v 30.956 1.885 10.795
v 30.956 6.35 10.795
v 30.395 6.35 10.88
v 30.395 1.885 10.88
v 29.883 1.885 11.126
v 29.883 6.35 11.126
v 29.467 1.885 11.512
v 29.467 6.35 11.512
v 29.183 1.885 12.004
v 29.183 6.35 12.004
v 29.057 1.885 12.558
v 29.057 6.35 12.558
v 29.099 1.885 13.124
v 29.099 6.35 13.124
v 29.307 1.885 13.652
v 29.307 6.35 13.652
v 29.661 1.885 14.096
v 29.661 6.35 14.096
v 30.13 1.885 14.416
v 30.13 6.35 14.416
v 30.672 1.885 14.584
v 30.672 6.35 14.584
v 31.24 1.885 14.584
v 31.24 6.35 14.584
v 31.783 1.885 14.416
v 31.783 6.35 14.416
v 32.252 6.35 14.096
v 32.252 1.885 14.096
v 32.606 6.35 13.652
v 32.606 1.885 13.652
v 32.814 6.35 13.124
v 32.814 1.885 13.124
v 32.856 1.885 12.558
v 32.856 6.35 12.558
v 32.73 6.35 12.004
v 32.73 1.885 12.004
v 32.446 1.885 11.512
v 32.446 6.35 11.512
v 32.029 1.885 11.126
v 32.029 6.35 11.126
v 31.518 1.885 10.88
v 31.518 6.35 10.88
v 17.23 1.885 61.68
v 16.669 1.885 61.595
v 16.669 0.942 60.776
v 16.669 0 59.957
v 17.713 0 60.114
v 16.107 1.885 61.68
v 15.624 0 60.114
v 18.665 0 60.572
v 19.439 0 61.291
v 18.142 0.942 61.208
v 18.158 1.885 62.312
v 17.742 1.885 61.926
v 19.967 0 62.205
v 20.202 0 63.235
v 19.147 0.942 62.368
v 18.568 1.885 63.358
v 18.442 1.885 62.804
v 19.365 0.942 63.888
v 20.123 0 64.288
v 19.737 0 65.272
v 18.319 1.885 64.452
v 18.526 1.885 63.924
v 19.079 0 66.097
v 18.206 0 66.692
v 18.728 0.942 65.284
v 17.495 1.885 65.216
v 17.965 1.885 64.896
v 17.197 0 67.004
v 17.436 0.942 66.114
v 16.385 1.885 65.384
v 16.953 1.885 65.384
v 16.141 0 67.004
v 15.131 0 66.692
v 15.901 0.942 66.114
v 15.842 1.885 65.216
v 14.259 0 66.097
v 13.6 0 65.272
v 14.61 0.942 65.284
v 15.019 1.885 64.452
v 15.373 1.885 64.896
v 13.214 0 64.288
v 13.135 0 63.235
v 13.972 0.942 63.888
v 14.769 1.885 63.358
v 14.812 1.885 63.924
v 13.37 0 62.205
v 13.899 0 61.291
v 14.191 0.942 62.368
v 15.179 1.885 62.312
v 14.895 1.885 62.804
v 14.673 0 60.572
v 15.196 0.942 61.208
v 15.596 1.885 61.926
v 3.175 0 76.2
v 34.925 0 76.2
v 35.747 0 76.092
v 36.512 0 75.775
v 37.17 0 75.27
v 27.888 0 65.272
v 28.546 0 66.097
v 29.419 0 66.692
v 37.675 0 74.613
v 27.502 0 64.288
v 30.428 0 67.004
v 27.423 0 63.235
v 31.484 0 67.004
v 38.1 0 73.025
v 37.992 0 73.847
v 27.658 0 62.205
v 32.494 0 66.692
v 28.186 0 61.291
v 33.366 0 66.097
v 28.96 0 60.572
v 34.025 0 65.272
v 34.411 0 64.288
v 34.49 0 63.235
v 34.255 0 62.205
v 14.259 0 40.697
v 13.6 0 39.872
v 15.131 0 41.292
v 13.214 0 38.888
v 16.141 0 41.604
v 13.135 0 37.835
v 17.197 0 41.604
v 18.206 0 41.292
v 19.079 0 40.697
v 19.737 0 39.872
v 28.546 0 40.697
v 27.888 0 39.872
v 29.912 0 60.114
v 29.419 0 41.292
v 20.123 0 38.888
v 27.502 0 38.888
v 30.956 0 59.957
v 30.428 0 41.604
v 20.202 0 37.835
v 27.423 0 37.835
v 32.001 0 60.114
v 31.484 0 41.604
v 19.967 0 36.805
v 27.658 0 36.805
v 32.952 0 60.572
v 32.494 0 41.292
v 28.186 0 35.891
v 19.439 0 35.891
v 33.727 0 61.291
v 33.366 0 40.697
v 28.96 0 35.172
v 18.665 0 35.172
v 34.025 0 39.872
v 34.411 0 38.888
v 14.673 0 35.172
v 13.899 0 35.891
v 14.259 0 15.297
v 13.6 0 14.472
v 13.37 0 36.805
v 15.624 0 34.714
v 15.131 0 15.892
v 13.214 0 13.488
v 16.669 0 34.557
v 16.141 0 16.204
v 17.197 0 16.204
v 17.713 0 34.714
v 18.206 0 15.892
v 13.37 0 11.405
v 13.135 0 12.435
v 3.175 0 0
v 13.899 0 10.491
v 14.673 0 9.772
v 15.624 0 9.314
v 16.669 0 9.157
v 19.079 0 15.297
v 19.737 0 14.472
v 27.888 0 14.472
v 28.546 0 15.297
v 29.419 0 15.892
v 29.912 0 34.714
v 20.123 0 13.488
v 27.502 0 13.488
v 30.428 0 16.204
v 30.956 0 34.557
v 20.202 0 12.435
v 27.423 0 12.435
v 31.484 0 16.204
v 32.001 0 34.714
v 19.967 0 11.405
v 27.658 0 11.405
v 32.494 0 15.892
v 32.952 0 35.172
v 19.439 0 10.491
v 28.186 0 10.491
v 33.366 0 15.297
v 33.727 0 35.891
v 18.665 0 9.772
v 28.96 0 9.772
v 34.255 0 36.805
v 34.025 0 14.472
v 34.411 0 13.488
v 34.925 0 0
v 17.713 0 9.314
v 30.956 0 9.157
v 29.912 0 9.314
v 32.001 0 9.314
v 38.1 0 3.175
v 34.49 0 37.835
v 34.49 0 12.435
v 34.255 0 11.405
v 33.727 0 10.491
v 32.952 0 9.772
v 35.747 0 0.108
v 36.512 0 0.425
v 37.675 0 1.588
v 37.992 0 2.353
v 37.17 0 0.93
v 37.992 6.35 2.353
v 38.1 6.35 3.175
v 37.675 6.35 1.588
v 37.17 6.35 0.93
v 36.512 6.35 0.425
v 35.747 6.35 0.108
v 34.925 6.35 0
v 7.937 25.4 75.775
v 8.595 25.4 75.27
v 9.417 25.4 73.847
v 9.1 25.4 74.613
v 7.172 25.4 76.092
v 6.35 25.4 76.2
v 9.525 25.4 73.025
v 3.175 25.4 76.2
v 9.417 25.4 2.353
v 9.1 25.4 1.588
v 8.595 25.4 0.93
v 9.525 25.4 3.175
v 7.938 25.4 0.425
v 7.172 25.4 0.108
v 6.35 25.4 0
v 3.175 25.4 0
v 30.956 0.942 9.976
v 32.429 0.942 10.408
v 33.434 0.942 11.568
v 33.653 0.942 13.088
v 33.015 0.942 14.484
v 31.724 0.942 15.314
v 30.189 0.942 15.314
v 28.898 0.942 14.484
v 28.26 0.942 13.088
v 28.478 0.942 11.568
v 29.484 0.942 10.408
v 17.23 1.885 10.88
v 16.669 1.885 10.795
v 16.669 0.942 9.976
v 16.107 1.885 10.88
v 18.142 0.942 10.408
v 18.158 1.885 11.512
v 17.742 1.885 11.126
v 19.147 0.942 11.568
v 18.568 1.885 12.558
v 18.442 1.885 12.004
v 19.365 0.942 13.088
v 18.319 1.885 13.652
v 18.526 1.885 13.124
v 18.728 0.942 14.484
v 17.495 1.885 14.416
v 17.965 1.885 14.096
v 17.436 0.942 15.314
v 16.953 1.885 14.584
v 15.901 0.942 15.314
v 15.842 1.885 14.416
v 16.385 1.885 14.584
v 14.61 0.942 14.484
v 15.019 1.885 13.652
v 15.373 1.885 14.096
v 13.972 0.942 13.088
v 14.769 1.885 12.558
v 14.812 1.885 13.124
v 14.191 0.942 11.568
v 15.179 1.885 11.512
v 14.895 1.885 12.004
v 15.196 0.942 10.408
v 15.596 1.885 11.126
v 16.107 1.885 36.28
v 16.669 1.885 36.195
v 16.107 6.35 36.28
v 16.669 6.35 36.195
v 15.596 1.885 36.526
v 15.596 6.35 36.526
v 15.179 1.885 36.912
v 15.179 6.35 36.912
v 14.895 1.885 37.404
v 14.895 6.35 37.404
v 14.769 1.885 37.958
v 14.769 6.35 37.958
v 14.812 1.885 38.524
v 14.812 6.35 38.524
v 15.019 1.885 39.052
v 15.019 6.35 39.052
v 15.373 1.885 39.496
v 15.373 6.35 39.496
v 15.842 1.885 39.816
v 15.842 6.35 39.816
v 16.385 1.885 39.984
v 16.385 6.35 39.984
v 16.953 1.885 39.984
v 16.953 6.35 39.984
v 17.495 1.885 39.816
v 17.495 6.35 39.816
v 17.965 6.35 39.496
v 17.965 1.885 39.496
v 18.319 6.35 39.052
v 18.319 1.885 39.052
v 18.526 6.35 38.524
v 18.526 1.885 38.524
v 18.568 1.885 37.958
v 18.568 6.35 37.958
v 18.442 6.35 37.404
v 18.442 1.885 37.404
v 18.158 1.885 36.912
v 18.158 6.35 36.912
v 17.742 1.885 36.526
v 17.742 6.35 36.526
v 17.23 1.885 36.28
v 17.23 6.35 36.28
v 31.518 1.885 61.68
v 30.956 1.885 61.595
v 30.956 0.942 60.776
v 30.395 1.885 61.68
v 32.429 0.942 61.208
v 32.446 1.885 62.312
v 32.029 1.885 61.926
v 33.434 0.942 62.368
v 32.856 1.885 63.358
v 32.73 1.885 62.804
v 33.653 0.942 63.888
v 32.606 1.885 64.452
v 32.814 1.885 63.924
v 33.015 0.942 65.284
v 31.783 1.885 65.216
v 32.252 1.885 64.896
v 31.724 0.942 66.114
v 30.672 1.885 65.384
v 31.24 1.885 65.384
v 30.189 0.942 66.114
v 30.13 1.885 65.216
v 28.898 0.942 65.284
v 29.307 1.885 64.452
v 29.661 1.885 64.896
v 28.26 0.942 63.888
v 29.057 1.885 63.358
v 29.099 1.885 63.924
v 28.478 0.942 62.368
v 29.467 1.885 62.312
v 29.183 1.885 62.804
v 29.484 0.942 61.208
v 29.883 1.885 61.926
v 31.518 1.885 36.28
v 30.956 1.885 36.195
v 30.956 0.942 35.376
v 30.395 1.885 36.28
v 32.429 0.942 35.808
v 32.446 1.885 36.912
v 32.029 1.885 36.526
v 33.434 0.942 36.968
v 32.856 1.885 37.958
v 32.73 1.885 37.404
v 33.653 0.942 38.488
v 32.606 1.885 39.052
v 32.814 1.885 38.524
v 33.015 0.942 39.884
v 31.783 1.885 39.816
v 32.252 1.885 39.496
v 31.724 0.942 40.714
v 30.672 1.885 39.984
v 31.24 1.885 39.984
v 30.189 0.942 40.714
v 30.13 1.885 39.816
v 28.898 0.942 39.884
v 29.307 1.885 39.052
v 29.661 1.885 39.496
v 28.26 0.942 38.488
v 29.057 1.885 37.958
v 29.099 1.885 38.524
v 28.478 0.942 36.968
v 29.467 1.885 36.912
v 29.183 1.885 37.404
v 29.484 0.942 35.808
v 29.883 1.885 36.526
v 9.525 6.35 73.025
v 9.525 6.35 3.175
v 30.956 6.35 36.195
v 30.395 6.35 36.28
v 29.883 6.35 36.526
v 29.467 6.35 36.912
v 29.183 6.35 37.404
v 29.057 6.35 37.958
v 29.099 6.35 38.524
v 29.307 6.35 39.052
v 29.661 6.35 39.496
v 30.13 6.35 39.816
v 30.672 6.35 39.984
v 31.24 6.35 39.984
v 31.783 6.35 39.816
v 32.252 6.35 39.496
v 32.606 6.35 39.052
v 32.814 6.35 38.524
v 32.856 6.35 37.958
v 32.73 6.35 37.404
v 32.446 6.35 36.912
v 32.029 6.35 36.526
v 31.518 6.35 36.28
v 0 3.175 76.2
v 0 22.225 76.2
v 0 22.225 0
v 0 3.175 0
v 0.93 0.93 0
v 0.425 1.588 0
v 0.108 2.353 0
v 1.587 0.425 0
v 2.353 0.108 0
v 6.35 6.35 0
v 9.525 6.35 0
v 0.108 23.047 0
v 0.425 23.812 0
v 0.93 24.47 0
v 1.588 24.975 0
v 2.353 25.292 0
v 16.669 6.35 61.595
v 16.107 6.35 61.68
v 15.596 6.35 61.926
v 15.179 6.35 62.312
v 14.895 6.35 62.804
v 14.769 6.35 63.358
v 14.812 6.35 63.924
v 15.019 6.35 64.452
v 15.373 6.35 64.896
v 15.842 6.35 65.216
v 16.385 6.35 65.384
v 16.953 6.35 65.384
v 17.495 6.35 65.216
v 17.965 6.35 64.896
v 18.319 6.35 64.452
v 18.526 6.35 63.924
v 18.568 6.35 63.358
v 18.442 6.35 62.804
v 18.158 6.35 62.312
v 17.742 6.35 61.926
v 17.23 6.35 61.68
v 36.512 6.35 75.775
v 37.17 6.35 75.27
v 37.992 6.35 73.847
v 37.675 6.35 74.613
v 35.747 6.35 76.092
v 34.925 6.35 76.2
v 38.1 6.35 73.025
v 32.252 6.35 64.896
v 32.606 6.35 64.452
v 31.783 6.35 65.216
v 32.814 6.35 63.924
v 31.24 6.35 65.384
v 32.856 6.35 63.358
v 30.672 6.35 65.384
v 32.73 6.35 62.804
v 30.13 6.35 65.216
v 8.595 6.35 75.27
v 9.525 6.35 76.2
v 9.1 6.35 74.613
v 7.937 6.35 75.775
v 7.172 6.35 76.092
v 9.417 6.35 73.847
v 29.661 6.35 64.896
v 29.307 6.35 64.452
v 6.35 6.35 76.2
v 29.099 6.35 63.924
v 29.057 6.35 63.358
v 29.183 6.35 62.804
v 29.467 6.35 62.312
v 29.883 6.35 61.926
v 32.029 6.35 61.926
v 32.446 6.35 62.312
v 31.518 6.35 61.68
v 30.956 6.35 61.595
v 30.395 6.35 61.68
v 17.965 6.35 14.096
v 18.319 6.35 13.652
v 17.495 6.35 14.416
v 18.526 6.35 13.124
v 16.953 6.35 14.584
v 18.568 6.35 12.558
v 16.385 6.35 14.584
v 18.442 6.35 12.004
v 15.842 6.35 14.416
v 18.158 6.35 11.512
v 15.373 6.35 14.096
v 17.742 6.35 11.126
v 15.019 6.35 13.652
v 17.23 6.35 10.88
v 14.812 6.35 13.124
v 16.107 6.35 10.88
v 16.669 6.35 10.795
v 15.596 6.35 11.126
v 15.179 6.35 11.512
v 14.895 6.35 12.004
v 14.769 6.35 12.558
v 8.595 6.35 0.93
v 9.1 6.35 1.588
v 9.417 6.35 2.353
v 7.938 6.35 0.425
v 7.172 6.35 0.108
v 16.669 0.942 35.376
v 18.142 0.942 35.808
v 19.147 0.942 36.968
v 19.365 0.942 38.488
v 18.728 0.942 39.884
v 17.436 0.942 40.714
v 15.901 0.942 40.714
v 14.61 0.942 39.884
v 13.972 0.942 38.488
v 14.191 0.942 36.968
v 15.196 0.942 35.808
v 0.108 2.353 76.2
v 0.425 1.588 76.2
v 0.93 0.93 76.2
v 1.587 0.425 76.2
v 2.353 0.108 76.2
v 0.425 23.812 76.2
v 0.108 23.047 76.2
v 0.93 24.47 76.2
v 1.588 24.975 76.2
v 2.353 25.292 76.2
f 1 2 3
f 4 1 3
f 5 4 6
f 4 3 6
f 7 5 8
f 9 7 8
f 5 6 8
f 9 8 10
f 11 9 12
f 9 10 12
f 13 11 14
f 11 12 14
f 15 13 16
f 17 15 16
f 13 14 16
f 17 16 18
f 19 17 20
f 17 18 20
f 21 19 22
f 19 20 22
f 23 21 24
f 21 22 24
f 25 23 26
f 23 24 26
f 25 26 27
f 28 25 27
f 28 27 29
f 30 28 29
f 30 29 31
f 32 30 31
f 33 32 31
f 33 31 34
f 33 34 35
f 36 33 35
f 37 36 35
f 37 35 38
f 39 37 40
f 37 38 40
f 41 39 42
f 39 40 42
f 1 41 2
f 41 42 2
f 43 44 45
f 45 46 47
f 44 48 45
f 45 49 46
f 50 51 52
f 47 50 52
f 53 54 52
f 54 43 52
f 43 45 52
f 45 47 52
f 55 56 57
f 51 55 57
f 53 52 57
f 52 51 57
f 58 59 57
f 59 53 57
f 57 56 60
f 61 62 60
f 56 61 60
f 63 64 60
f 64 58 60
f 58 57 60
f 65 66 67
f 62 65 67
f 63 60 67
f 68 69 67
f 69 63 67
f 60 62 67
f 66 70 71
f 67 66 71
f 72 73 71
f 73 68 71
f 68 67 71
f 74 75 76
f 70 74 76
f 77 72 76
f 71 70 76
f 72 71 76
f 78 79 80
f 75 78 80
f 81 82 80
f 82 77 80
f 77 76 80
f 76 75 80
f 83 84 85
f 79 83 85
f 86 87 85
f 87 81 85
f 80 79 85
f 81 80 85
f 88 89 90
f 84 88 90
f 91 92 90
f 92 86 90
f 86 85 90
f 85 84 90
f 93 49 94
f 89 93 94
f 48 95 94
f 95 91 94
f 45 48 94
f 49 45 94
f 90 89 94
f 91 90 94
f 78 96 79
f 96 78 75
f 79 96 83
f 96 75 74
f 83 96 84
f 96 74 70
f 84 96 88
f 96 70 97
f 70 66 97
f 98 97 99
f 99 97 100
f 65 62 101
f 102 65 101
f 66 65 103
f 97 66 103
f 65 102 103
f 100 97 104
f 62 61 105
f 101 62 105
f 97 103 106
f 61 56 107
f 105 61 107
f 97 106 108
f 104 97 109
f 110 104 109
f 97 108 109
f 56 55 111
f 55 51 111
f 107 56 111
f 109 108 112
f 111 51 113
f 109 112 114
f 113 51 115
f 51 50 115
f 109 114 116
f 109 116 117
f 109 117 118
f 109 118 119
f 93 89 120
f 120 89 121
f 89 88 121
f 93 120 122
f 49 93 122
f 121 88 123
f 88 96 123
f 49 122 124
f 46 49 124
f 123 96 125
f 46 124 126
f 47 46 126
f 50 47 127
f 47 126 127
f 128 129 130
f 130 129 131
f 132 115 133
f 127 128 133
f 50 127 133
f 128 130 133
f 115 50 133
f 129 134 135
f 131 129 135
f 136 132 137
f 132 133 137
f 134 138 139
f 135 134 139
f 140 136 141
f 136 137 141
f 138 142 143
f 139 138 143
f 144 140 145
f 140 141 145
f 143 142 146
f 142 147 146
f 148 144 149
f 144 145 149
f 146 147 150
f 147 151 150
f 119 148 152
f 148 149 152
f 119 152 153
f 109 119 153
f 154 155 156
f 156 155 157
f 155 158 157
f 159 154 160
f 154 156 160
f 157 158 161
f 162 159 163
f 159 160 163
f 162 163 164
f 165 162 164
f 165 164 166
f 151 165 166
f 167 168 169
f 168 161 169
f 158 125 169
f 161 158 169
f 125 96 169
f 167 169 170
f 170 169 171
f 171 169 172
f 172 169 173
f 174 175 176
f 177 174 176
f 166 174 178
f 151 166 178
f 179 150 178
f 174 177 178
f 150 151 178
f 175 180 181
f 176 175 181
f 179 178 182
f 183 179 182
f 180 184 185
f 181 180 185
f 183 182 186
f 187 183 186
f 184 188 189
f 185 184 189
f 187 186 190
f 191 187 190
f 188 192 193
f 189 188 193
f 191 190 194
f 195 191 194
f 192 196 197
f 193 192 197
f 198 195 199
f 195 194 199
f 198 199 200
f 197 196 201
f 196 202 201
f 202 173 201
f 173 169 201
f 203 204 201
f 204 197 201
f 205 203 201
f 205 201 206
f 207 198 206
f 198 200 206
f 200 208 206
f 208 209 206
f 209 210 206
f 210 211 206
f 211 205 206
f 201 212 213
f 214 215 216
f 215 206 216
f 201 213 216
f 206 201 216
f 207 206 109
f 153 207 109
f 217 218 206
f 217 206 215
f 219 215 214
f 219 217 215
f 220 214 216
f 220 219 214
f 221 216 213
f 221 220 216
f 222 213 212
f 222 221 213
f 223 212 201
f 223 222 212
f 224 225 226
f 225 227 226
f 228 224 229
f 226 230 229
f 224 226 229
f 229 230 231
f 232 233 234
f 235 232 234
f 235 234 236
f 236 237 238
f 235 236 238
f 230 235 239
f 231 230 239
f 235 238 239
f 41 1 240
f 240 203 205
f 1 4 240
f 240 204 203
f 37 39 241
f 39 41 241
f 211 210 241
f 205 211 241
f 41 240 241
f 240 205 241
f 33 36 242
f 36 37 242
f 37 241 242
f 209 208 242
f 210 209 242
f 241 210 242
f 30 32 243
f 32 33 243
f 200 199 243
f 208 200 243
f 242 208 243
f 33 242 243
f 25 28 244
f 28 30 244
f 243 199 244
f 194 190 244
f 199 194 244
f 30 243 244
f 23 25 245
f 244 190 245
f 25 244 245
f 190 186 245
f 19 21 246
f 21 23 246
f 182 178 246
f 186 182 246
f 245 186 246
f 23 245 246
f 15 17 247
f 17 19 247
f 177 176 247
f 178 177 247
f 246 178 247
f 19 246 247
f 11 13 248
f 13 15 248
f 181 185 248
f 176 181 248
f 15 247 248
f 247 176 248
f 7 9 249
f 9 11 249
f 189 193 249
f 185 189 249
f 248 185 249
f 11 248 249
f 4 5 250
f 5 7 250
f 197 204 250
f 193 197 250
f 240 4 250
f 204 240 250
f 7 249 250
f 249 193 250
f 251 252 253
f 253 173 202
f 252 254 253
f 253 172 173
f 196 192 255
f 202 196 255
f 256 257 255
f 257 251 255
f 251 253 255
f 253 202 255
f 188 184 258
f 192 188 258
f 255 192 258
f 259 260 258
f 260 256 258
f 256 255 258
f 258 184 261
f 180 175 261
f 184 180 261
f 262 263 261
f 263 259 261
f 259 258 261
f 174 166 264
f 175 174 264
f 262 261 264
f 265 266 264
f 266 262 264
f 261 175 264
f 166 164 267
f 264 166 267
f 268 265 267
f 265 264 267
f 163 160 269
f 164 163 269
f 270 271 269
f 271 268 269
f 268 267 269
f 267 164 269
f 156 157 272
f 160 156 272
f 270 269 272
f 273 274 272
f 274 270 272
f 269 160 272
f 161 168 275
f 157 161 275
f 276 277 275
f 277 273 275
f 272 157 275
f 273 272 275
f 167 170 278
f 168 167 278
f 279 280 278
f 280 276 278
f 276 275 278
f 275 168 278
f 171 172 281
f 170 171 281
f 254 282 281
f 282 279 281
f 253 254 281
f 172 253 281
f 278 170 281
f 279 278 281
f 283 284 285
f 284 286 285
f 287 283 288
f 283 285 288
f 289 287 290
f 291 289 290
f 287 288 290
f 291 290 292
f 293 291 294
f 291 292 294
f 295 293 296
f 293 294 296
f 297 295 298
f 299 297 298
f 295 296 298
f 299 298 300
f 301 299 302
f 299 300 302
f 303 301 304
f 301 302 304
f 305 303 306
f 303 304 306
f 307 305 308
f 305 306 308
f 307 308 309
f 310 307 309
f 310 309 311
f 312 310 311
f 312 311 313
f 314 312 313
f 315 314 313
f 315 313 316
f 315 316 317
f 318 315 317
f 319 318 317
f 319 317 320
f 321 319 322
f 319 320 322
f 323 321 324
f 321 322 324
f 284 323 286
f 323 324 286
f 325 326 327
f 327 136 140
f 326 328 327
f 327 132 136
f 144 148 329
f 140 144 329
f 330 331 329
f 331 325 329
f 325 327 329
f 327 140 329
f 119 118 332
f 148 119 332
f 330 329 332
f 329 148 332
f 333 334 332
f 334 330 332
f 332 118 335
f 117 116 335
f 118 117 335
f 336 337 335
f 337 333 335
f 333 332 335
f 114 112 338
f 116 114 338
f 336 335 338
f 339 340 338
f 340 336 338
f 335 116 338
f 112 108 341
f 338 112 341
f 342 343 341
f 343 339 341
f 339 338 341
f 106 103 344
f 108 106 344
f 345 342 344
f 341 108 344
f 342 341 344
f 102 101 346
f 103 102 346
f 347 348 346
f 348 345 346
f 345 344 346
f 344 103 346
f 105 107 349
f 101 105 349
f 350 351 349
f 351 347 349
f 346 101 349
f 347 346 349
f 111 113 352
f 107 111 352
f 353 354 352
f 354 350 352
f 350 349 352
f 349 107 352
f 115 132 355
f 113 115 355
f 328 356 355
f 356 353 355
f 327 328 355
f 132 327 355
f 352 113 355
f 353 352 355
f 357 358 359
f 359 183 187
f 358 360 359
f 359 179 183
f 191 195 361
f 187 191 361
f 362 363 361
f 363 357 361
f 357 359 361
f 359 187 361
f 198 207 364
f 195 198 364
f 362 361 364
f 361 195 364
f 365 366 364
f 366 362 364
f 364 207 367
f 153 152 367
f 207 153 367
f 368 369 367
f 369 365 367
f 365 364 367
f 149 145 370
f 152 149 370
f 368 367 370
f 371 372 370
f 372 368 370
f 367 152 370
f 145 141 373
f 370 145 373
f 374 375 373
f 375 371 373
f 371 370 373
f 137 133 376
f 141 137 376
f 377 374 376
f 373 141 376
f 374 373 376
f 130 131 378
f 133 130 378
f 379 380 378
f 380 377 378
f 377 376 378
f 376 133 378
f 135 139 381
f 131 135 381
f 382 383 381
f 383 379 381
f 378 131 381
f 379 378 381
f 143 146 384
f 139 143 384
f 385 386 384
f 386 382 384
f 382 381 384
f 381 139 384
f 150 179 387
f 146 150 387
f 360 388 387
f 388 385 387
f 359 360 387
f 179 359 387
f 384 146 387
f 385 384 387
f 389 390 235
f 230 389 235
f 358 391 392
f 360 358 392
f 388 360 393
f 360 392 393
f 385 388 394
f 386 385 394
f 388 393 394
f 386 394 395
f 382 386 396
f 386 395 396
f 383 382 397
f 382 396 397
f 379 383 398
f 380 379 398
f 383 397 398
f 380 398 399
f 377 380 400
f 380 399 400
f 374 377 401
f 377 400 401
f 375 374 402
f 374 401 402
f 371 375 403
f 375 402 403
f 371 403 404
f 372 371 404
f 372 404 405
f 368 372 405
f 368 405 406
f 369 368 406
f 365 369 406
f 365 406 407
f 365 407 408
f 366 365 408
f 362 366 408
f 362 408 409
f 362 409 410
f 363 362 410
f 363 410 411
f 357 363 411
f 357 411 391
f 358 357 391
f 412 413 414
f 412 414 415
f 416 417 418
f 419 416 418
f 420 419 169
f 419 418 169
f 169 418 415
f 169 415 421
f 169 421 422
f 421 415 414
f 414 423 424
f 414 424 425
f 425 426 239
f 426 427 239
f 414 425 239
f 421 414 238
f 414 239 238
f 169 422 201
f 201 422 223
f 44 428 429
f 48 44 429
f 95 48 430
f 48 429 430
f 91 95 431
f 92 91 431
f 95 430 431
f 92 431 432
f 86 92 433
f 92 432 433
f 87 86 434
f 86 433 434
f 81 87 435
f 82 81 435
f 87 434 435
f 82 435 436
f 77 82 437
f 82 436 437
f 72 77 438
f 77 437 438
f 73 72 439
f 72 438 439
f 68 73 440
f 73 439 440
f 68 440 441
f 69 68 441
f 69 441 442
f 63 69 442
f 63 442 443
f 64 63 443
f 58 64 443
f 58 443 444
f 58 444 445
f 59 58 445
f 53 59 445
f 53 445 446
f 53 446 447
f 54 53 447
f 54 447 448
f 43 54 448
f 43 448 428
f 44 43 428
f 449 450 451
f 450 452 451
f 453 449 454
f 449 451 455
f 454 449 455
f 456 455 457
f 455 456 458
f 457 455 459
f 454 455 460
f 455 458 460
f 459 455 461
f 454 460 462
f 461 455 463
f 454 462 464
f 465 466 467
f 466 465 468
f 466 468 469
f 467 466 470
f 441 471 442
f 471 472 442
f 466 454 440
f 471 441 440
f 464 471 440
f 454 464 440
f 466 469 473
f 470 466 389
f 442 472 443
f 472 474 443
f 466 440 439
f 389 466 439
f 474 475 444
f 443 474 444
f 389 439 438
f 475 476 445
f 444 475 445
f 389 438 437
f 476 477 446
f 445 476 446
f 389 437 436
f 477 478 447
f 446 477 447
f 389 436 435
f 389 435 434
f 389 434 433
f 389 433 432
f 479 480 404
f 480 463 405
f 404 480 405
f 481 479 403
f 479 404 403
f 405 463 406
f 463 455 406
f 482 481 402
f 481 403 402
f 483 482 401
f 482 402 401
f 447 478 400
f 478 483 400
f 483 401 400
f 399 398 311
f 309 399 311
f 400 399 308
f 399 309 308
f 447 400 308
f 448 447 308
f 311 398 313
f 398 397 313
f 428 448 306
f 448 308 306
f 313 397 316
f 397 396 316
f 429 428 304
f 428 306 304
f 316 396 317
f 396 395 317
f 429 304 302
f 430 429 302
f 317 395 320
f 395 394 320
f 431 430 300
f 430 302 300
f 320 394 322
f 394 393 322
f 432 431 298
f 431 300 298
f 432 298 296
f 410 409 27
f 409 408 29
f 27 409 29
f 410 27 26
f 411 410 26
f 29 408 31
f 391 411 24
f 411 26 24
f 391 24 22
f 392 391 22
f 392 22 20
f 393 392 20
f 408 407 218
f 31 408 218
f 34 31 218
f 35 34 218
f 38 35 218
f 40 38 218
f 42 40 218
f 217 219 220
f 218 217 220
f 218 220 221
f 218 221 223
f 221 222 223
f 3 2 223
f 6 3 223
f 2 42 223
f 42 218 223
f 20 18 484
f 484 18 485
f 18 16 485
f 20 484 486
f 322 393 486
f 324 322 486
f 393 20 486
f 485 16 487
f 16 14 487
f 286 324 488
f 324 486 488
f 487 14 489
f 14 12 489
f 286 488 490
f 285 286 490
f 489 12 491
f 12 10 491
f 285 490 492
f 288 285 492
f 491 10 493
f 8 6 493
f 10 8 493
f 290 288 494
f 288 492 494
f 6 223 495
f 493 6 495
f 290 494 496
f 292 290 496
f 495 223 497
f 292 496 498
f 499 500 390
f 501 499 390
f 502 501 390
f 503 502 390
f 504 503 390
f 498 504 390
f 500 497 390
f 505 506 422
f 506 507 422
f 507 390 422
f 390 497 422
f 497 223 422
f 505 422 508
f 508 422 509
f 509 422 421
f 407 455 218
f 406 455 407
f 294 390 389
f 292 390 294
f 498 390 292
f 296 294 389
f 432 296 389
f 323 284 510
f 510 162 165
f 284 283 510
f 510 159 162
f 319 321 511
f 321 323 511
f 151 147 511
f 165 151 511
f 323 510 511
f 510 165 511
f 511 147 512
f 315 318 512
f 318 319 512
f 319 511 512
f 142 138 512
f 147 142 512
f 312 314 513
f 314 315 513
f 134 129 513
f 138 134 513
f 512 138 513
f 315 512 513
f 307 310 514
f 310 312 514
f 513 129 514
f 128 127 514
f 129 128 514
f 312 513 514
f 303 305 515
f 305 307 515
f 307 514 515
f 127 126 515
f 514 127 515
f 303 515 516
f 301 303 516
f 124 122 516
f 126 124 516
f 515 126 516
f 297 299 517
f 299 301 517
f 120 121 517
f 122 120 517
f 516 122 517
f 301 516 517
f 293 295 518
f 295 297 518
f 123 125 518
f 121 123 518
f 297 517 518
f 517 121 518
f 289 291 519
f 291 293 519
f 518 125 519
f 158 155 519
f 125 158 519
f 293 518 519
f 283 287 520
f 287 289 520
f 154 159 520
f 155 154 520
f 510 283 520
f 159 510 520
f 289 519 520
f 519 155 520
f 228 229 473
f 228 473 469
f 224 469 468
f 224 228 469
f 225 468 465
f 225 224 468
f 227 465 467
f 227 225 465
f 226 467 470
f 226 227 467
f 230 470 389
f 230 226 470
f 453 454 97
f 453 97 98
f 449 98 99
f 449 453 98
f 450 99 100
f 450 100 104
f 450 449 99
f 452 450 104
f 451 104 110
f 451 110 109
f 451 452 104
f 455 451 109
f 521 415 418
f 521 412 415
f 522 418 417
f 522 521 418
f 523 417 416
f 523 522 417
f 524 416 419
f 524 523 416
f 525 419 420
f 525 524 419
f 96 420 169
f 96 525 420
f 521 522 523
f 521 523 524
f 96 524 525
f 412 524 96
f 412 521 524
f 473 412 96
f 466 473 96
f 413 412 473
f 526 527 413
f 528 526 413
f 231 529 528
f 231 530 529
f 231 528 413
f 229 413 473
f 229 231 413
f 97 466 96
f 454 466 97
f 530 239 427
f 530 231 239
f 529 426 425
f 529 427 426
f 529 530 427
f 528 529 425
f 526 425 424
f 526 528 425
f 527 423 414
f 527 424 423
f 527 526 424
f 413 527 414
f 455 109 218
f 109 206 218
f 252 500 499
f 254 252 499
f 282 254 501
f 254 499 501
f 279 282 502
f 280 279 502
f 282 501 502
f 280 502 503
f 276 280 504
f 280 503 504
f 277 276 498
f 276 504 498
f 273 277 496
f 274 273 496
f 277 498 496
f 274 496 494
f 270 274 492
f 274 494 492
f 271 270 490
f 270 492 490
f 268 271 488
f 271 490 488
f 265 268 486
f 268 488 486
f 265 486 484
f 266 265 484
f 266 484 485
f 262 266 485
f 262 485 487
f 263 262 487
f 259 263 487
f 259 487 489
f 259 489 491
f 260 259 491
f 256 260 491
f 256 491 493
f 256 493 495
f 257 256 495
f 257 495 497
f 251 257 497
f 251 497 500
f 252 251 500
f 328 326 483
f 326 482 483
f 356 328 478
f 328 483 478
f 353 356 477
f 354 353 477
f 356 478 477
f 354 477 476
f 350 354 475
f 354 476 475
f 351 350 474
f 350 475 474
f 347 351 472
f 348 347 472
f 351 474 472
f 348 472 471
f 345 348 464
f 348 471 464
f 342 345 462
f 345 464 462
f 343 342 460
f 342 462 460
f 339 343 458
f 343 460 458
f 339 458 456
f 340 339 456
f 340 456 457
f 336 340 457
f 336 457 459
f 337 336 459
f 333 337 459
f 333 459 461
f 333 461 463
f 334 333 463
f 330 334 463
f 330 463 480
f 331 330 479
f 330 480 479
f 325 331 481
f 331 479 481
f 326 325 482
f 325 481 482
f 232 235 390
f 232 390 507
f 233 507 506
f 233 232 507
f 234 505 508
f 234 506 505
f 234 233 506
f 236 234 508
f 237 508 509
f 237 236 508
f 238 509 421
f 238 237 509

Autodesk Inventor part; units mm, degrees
ref_plane "YZ Plane" through (0, 0, 0) normal (1, 0, 0) x (0, 1, 0)
ref_plane "XZ Plane" through (0, 0, 0) normal (0, 1, 0) x (-1, 0, 0)
ref_plane "XY Plane" through (0, 0, 0) normal (0, 0, 1) x (1, 0, 0)
sketch "Sketch1" plane through (0, 0, 0) normal (0, 0, 1) x (1, 0, 0)
  line L0 (0, 0) -> (9.525, 0)
  line L1 (9.525, 0) -> (9.525, 25.4)
  line L2 (9.525, 25.4) -> (0, 25.4)
  line L3 (0, 25.4) -> (0, 0)
  line L4 (0, 0) -> (38.1, 0)
  line L5 (38.1, 0) -> (38.1, 6.35)
  line L6 (38.1, 6.35) -> (0, 6.35)
  line L7 (0, 6.35) -> (0, 0)
  line L8 (9.525, 25.4) -> (12.7508, 25.4)
  line L9 (12.7508, 25.4) -> (12.7508, 0) construction
  line L10 (12.7508, 0) -> (9.525, 0)
  line L11 (9.525, 0) -> (9.525, 25.4)
  point P0 (9.525, 6.35)
  dimension "d0" = 9.525
  dimension "d1" = 25.4
  dimension "d2" = 38.1
  dimension "d3" = 6.35
  dimension "d4" = 3.2258
extrude "Extrusion1" add sketch "Sketch1" along normal blind 76.2
sketch "Sketch2" plane through (9.525, 0, 0) normal (0, 1, 0) x (1, 0, 0)
  line L0 (28.575, -76.2) -> (0, -76.2) projected
  line L1 (14.2875, -76.2) -> (14.2875, 0) construction
  line L2 (28.575, 0) -> (0, 0) projected
  line L3 (28.575, 0) -> (28.575, -76.2) projected
  point P0 (-9.525, 0)
  point P1 (21.4312, -63.5)
  point P2 (21.4312, -38.1)
  point P3 (21.4312, -12.7)
  point P4 (7.1437, -63.5)
  point P5 (7.1437, -38.1)
  point P6 (7.1437, -12.7)
  dimension "d8" = 7.1437
  dimension "d9" = 14.2875
  dimension "d10" = 12.7
  dimension "d13" = 25.4
  dimension "d16" = 14.2875
hole "Hole1" at (30.9563, 0, 63.5) at (30.9563, 0, 38.1) at (30.9563, 0, 12.7) at (16.6688, 0, 63.5) at (16.6688, 0, 38.1) at (16.6688, 0, 12.7) direction (0, 1, 0) diameter 3.81 end through all countersink diameter 7.0866 countersink angle 82 clearance for "Flat Head Machine Screw (82)" size "#6" standard "Ansi Unified Screw Threads"
fillet "Fillet1" radius 3.175 5 edges at (9.525, 15.875, 76.2) (9.525, 15.875, 0) (38.1, 3.175, 76.2) (38.1, 3.175, 0) (0, 0, 38.1)
fillet "Fillet2" radius 3.175 1 edges at (0, 25.4, 38.1)
equation "\"d8\" = 0.5 * d9"
equation "\"d16\" = d9"
properties part number "Arena Top Bracket"
